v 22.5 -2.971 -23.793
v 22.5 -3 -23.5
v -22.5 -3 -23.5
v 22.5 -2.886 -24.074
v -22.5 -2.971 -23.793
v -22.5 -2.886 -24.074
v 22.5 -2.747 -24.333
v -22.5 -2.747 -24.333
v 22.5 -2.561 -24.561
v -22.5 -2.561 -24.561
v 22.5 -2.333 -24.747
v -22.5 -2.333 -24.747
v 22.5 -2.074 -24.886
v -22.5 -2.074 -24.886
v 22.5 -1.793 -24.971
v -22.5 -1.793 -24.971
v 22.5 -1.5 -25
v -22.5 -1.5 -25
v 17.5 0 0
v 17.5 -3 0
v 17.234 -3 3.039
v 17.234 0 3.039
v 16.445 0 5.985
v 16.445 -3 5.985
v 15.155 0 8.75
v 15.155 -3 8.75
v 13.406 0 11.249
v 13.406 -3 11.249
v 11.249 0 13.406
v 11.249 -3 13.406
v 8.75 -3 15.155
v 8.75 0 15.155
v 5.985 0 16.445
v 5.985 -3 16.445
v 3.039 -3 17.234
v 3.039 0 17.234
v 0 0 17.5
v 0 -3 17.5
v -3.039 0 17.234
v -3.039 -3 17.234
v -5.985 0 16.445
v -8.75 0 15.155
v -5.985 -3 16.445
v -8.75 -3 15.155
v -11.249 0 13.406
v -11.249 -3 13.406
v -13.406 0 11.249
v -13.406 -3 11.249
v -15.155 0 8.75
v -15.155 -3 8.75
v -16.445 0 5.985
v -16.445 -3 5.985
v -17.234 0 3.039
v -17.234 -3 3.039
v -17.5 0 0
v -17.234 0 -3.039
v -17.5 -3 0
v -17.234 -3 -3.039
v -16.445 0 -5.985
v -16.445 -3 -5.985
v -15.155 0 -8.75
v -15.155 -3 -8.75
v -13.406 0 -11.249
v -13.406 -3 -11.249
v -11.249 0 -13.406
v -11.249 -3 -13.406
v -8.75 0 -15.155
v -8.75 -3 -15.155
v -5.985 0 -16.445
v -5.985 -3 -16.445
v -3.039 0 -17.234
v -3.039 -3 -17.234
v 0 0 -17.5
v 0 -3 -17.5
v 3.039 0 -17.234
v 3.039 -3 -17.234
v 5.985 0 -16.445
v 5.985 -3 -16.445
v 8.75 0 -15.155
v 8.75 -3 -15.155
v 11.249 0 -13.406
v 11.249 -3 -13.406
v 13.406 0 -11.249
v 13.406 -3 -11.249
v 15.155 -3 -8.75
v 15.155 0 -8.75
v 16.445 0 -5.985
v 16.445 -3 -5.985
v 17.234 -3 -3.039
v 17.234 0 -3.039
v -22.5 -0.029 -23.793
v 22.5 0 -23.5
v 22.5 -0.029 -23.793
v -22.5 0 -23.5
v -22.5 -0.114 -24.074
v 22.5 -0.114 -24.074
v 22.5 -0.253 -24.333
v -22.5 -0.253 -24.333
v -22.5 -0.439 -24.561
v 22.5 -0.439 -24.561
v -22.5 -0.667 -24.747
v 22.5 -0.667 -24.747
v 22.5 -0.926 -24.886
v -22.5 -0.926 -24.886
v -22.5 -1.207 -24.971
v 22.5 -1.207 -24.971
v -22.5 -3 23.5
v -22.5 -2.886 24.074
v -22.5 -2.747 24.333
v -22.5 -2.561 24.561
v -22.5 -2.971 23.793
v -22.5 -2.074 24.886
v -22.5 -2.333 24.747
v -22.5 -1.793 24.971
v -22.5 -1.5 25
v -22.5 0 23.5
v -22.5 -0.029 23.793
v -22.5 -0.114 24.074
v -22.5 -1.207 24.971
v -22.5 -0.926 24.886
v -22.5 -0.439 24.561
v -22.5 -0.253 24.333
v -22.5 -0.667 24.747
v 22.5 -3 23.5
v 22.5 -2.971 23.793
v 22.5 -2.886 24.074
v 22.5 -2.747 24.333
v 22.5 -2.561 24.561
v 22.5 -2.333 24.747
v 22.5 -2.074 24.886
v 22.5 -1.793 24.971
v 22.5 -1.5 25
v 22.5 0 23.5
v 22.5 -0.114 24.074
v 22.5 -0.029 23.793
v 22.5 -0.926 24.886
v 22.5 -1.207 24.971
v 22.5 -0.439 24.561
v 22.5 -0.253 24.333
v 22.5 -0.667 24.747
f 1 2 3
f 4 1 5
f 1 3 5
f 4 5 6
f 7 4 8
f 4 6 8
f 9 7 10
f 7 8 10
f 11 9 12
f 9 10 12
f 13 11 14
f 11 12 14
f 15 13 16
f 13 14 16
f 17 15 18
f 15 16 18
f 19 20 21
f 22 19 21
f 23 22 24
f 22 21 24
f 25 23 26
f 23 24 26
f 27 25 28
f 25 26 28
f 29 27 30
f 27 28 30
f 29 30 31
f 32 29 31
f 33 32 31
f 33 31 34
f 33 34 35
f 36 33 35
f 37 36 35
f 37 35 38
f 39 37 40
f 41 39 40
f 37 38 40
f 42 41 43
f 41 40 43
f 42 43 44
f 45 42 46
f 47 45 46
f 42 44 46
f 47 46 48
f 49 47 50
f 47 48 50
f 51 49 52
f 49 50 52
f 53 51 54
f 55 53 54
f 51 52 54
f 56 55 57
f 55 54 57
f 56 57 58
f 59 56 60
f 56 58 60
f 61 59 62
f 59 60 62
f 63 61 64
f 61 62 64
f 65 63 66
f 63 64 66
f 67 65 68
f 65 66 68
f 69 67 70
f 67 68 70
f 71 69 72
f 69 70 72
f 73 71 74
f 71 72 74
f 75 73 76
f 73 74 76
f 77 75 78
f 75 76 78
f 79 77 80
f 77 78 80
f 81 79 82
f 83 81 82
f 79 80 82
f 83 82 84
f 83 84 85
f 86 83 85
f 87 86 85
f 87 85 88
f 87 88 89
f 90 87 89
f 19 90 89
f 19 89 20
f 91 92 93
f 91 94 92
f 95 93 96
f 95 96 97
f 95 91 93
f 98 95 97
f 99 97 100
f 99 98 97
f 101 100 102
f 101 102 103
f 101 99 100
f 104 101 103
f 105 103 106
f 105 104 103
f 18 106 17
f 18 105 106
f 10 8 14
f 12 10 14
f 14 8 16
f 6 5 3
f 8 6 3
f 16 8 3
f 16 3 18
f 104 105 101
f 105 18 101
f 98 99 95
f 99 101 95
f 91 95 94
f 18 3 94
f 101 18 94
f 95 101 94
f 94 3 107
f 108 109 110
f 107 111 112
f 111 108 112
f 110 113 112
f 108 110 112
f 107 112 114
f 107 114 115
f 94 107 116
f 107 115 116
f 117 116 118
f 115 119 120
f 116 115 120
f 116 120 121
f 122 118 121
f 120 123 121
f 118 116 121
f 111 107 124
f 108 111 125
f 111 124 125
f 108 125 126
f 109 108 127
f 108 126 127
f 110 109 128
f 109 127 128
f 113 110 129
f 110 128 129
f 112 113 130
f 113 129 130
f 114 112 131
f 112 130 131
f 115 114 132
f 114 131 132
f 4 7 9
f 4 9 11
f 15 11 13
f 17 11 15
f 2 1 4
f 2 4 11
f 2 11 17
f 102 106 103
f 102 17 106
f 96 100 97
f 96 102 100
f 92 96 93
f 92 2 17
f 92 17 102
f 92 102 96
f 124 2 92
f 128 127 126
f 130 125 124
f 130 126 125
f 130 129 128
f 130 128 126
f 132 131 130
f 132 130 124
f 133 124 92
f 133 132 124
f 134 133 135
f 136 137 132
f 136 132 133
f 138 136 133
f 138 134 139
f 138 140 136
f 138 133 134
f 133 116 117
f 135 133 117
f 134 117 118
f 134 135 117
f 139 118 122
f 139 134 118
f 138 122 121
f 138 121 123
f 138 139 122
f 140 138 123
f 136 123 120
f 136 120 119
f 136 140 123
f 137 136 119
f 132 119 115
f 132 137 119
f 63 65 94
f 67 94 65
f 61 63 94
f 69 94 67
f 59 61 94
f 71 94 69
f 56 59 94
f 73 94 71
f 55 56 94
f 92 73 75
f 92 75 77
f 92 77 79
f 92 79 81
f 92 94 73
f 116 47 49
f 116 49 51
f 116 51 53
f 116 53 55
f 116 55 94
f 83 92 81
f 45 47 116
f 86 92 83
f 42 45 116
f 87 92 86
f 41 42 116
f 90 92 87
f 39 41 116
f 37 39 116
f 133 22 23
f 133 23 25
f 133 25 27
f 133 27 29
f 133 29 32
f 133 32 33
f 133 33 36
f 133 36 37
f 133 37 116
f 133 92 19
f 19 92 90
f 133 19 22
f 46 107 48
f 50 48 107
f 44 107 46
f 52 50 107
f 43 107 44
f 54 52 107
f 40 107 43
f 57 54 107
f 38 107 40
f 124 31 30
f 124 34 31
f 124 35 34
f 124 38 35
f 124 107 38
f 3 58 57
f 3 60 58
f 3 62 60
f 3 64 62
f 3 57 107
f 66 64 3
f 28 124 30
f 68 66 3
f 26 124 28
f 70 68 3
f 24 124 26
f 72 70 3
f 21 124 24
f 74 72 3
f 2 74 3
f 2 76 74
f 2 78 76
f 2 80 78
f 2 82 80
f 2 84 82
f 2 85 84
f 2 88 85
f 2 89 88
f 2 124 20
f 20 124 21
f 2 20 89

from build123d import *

# Parameters (mm, degrees)
F1_DEPTH     = 22.5
F2_R         = 18.6
F3_DEPTH     = 6
F4_R         = 17.5
F5_DEPTH     = 3
F7_DEPTH     = 3
F8_DEPTH     = 3
F14_DEPTH    = 3
F9_T1_DEPTH  = 3
F9_T6_DEPTH  = 3
F9_T11_DEPTH = 3
F15_W        = 6
F15_H        = 97.4
F10_DEPTH    = 45.001
F11_R        = 1.49999


# Not quite as in the source:
# - a fillet or chamfer that OpenCascade refuses, or shapes differently, is made with other operations: its cross-section is extruded or revolved along the edge and cut away or added
# - a fillet or chamfer is up to 0.001 mm smaller than in the source, because OpenCascade refuses the exact size


with BuildPart() as f1:
    # F0 (on Right) → F1 (new body, symmetric)
    with BuildSketch(Plane.YZ):
        Polygon((0, -25), (0, 25), (-3, 25), (-3, 21.25), (-9, 21.25), (-9, -21.25), (-3, -21.25), (-3, -25), align=None)
    extrude(amount=F1_DEPTH, both=True)

    # F2 (on face) → F3 (cut)
    with BuildSketch(Plane.XZ.offset(9)):
        Circle(F2_R)
    extrude(amount=-F3_DEPTH, mode=Mode.SUBTRACT)

    # F4 (on face) → F5 (cut, through all)
    with BuildSketch(Plane.XZ.offset(3)):
        Circle(F4_R)
    extrude(amount=-F5_DEPTH, mode=Mode.SUBTRACT)

    # F6 (on face) → F7 (join)
    with BuildSketch(Plane.XZ.offset(9)):
        with BuildLine():
            Line((-1.6773361726, 21.1145450883), (-1.5, 21.05))
            Line((-1.5, 21.05), (2.8857066002, 21.05))
            Line((2.8857066002, 21.05), (-1.1643059576, 22.5240840195))
            ThreePointArc((-1.1643059576, 22.5240840195), (-1.8221335094, 23.4812290467), (-1.1313028087, 24.4148331565))
            Line((-1.1313028087, 24.4148331565), (1.1823725422, 25.1665918487))
            ThreePointArc((1.1823725422, 25.1665918487), (2.9098300563, 27.5442331395), (1.1823725422, 29.9218744302))
            Line((1.1823725422, 29.9218744302), (-2.6423503277, 31.1646022233))
            ThreePointArc((-2.6423503277, 31.1646022233), (-3.3282367753, 32.0148264964), (-2.8268835217, 32.9853760566))
            Line((-2.8268835217, 32.9853760566), (3.5672088043, 36.6139176646))
            ThreePointArc((3.5672088043, 36.6139176646), (4.8205919381, 39.0402915651), (3.1058758193, 41.165852248))
            Line((3.1058758193, 41.165852248), (-0.0769036922, 42.2))
            Line((-0.0769036922, 42.2), (-4.9310056584, 42.2))
            Line((-4.9310056584, 42.2), (2.6423503277, 39.7392674735))
            ThreePointArc((2.6423503277, 39.7392674735), (3.3282367753, 38.8890432004), (2.8268835217, 37.9184936402))
            Line((2.8268835217, 37.9184936402), (-3.5672088043, 34.2899520321))
            ThreePointArc((-3.5672088043, 34.2899520321), (-4.8205919381, 31.8635781317), (-3.1058758193, 29.7380174488))
            Line((-3.1058758193, 29.7380174488), (0.7188470506, 28.4952896558))
            ThreePointArc((0.7188470506, 28.4952896558), (1.4098300563, 27.5442331395), (0.7188470506, 26.5931766232))
            Line((0.7188470506, 26.5931766232), (-1.5948283002, 25.841417931))
            ThreePointArc((-1.5948283002, 25.841417931), (-3.3219050522, 23.5074076563), (-1.6773361726, 21.1145450883))
        make_face()
        with BuildLine():
            Line((3.5672088043, -36.6139176646), (-2.8268835217, -32.9853760566))
            ThreePointArc((-2.8268835217, -32.9853760566), (-3.3282367753, -32.0148264964), (-2.6423503277, -31.1646022233))
            Line((-2.6423503277, -31.1646022233), (1.1823725422, -29.9218744302))
            ThreePointArc((1.1823725422, -29.9218744302), (2.9098300563, -27.5442331395), (1.1823725422, -25.1665918487))
            Line((1.1823725422, -25.1665918487), (-1.1313028087, -24.4148331565))
            ThreePointArc((-1.1313028087, -24.4148331565), (-1.8221335094, -23.4812290467), (-1.1643059576, -22.5240840195))
            Line((-1.1643059576, -22.5240840195), (2.8857066002, -21.05))
            Line((2.8857066002, -21.05), (-1.5, -21.05))
            Line((-1.5, -21.05), (-1.6773361726, -21.1145450883))
            ThreePointArc((-1.6773361726, -21.1145450883), (-3.3219050522, -23.5074076563), (-1.5948283002, -25.841417931))
            Line((-1.5948283002, -25.841417931), (0.7188470506, -26.5931766232))
            ThreePointArc((0.7188470506, -26.5931766232), (1.4098300563, -27.5442331395), (0.7188470506, -28.4952896558))
            Line((0.7188470506, -28.4952896558), (-3.1058758193, -29.7380174488))
            ThreePointArc((-3.1058758193, -29.7380174488), (-4.8205919381, -31.8635781317), (-3.5672088043, -34.2899520321))
            Line((-3.5672088043, -34.2899520321), (2.8268835217, -37.9184936402))
            ThreePointArc((2.8268835217, -37.9184936402), (3.3282367753, -38.8890432004), (2.6423503277, -39.7392674735))
            Line((2.6423503277, -39.7392674735), (-4.9310056584, -42.2))
            Line((-4.9310056584, -42.2), (-0.0769036922, -42.2))
            Line((-0.0769036922, -42.2), (3.1058758193, -41.165852248))
            ThreePointArc((3.1058758193, -41.165852248), (4.8205919381, -39.0402915651), (3.5672088043, -36.6139176646))
        make_face()
    extrude(amount=-F7_DEPTH)

    # F12 (on face) → F8 (join)
    with BuildSketch(Plane.XZ.offset(9)):
        with BuildLine():
            Line((-10.0039546753, 45.1082380117), (-10.0039546753, 41.7))
            Line((-10.0039546753, 41.7), (-2.5039546753, 41.7))
            Line((-2.5039546753, 41.7), (4.9960453247, 41.7))
            Line((4.9960453247, 41.7), (4.9960453247, 45.1082380117))
            ThreePointArc((4.9960453247, 45.1082380117), (4.9619908828, 45.2896070742), (4.8644663773, 45.446270448))
            ThreePointArc((4.8644663773, 45.446270448), (-2.5039546753, 48.6856217223), (-9.872375728, 45.446270448))
            ThreePointArc((-9.872375728, 45.446270448), (-9.9699002335, 45.2896070742), (-10.0039546753, 45.1082380117))
        make_face()
        with BuildLine():
            Line((4.9960453247, -41.7), (-10.0039546753, -41.7))
            Line((-10.0039546753, -41.7), (-10.0039546753, -45.1082380117))
            ThreePointArc((-10.0039546753, -45.1082380117), (-9.9699002335, -45.2896070742), (-9.872375728, -45.446270448))
            ThreePointArc((-9.872375728, -45.446270448), (-2.5039546753, -48.6856217223), (4.8644663773, -45.446270448))
            ThreePointArc((4.8644663773, -45.446270448), (4.9619908828, -45.2896070742), (4.9960453247, -45.1082380117))
            Line((4.9960453247, -45.1082380117), (4.9960453247, -41.7))
        make_face()
    extrude(amount=-F8_DEPTH)

    # F13 (on face) → F14 (join)
    with BuildSketch(Plane(origin=(0, -6, 0), x_dir=(-1, 0, 0), z_dir=(0, 1, 0))):
        Polygon((-4.9960453247, 41.7), (10.0039546753, 41.7), (10.0039546753, 41.9), (9.0039546753, 42.9), (8.0039546753, 41.9), (7.0039546753, 42.9), (6.0039546753, 41.9), (5.0039546753, 42.9), (4.0039546753, 41.9), (3.0039546753, 42.9), (2.0039546753, 41.9), (1.0039546753, 42.9), (0.0039546753, 41.9), (-0.9960453247, 42.9), (-1.9960453247, 41.9), (-2.9960453247, 42.9), (-3.9960453247, 41.9), (-4.9960453247, 42.9), align=None)
        Polygon((-4.9960453247, -41.7), (-4.9960453247, -42.9), (-3.9960453247, -41.9), (-2.9960453247, -42.9), (-1.9960453247, -41.9), (-0.9960453247, -42.9), (0.0039546753, -41.9), (1.0039546753, -42.9), (2.0039546753, -41.9), (3.0039546753, -42.9), (4.0039546753, -41.9), (5.0039546753, -42.9), (6.0039546753, -41.9), (7.0039546753, -42.9), (8.0039546753, -41.9), (9.0039546753, -42.9), (10.0039546753, -41.9), (10.0039546753, -41.7), align=None)
    extrude(amount=F14_DEPTH)

    # F9: fillet of radius 1 on 8 edges, made by hand

    # F9_s2 → F9_t1 (join)
    with BuildSketch(Plane.XZ.offset(6)):
        with BuildLine():
            ThreePointArc((-3.1671397399, 22.5967933258), (-3.2844738139, 21.6785077979), (-4.1050813101, 21.25))
            Line((-4.1050813101, 21.25), (-1.9838334832, 21.25))
            ThreePointArc((-1.9838334832, 21.25), (-2.7003635819, 21.813678492), (-3.1671397399, 22.5967933258))
        make_face()
        with BuildLine():
            ThreePointArc((2.1705179537, 21.3103073792), (2.3388899194, 21.265192247), (2.5125380971, 21.25))
            Line((2.5125380971, 21.25), (2.3362111164, 21.25))
            Line((2.3362111164, 21.25), (2.1705179537, 21.3103073792))
        make_face()
        with BuildLine():
            ThreePointArc((-3.2415313358, 41.6510565163), (-3.3941138651, 41.6876883406), (-3.5505483302, 41.7))
            Line((-3.5505483302, 41.7), (-3.3921638899, 41.7))
            Line((-3.3921638899, 41.7), (-3.2415313358, 41.6510565163))
        make_face()
        with BuildLine():
            ThreePointArc((-3.1671397399, -22.5967933258), (-3.2844738139, -21.6785077979), (-4.1050813101, -21.25))
            Line((-4.1050813101, -21.25), (-1.9838334832, -21.25))
            ThreePointArc((-1.9838334832, -21.25), (-2.7003635819, -21.813678492), (-3.1671397399, -22.5967933258))
        make_face()
        with BuildLine():
            ThreePointArc((-3.5505483302, -41.7), (-3.3941138651, -41.6876883406), (-3.2415313358, -41.6510565163))
            Line((-3.2415313358, -41.6510565163), (-3.3921638899, -41.7))
            Line((-3.3921638899, -41.7), (-3.5505483302, -41.7))
        make_face()
        with BuildLine():
            ThreePointArc((2.1705179537, -21.3103073792), (2.3388899194, -21.265192247), (2.5125380971, -21.25))
            Line((2.5125380971, -21.25), (2.3362111164, -21.25))
            Line((2.3362111164, -21.25), (2.1705179537, -21.3103073792))
        make_face()
    extrude(amount=F9_T1_DEPTH)


with BuildPart() as f9_tool4:
    # F9_s5 → F9_t6 (new body)
    with BuildSketch(Plane.XZ.offset(9)):
        with BuildLine():
            ThreePointArc((5.265067062, 41.7), (4.3857987751, 41.1763268621), (4.4274288538, 40.1537745592))
            Line((4.4274288538, 40.1537745592), (4.343665033, 40.0991520151))
            ThreePointArc((4.343665033, 40.0991520151), (3.0749741198, 41.0707465963), (1.431036377, 41.6048943484))
            Line((1.431036377, 41.6048943484), (1.4619380764, 41.8))
            Line((1.4619380764, 41.8), (5.265067062, 41.8))
            Line((5.265067062, 41.8), (5.265067062, 41.7))
        make_face()
    extrude(amount=-F9_T6_DEPTH)

    split(bisect_by=Plane.YZ.offset(4.9960453247), keep=Keep.BOTTOM)


with BuildPart() as f1_1:
    add(f1.part)

    # F9_t3: union F9_tool4
    add(f9_tool4.part)


with BuildPart() as f9_tool9:
    # F9_s10 → F9_t11 (new body)
    with BuildSketch(Plane.XZ.offset(6)):
        with BuildLine():
            ThreePointArc((4.4274288538, -40.1537745592), (4.3857987751, -41.1763268621), (5.265067062, -41.7))
            Line((5.265067062, -41.7), (5.265067062, -41.8))
            Line((5.265067062, -41.8), (1.4619380764, -41.8))
            Line((1.4619380764, -41.8), (1.431036377, -41.6048943484))
            ThreePointArc((1.431036377, -41.6048943484), (3.0749741198, -41.0707465963), (4.343665033, -40.0991520151))
            Line((4.343665033, -40.0991520151), (4.4274288538, -40.1537745592))
        make_face()
    extrude(amount=F9_T11_DEPTH)

    split(bisect_by=Plane.YZ.offset(4.9960453247), keep=Keep.BOTTOM)


with BuildPart() as f1_2:
    add(f1_1.part)

    # F9_t8: union F9_tool9
    add(f9_tool9.part)

    # F15 (on face) → F10 (cut, through all)
    with BuildSketch(Plane.YZ.offset(22.5)):
        with Locations((-6, 0)):
            Rectangle(F15_W, F15_H)
    extrude(amount=-F10_DEPTH, mode=Mode.SUBTRACT)

    # F11 (radius 1.5 in the source; OpenCascade refuses exactly that, so slightly less here)
    f11_edges = [f1_2.edges().sort_by_distance(p)[0] for p in [
        (0, -3, 25),
        (0, 0, 25),
        (0, -3, -25),
        (0, 0, -25),
    ]]
    fillet(f11_edges, radius=F11_R)


solid = f1_2.part
